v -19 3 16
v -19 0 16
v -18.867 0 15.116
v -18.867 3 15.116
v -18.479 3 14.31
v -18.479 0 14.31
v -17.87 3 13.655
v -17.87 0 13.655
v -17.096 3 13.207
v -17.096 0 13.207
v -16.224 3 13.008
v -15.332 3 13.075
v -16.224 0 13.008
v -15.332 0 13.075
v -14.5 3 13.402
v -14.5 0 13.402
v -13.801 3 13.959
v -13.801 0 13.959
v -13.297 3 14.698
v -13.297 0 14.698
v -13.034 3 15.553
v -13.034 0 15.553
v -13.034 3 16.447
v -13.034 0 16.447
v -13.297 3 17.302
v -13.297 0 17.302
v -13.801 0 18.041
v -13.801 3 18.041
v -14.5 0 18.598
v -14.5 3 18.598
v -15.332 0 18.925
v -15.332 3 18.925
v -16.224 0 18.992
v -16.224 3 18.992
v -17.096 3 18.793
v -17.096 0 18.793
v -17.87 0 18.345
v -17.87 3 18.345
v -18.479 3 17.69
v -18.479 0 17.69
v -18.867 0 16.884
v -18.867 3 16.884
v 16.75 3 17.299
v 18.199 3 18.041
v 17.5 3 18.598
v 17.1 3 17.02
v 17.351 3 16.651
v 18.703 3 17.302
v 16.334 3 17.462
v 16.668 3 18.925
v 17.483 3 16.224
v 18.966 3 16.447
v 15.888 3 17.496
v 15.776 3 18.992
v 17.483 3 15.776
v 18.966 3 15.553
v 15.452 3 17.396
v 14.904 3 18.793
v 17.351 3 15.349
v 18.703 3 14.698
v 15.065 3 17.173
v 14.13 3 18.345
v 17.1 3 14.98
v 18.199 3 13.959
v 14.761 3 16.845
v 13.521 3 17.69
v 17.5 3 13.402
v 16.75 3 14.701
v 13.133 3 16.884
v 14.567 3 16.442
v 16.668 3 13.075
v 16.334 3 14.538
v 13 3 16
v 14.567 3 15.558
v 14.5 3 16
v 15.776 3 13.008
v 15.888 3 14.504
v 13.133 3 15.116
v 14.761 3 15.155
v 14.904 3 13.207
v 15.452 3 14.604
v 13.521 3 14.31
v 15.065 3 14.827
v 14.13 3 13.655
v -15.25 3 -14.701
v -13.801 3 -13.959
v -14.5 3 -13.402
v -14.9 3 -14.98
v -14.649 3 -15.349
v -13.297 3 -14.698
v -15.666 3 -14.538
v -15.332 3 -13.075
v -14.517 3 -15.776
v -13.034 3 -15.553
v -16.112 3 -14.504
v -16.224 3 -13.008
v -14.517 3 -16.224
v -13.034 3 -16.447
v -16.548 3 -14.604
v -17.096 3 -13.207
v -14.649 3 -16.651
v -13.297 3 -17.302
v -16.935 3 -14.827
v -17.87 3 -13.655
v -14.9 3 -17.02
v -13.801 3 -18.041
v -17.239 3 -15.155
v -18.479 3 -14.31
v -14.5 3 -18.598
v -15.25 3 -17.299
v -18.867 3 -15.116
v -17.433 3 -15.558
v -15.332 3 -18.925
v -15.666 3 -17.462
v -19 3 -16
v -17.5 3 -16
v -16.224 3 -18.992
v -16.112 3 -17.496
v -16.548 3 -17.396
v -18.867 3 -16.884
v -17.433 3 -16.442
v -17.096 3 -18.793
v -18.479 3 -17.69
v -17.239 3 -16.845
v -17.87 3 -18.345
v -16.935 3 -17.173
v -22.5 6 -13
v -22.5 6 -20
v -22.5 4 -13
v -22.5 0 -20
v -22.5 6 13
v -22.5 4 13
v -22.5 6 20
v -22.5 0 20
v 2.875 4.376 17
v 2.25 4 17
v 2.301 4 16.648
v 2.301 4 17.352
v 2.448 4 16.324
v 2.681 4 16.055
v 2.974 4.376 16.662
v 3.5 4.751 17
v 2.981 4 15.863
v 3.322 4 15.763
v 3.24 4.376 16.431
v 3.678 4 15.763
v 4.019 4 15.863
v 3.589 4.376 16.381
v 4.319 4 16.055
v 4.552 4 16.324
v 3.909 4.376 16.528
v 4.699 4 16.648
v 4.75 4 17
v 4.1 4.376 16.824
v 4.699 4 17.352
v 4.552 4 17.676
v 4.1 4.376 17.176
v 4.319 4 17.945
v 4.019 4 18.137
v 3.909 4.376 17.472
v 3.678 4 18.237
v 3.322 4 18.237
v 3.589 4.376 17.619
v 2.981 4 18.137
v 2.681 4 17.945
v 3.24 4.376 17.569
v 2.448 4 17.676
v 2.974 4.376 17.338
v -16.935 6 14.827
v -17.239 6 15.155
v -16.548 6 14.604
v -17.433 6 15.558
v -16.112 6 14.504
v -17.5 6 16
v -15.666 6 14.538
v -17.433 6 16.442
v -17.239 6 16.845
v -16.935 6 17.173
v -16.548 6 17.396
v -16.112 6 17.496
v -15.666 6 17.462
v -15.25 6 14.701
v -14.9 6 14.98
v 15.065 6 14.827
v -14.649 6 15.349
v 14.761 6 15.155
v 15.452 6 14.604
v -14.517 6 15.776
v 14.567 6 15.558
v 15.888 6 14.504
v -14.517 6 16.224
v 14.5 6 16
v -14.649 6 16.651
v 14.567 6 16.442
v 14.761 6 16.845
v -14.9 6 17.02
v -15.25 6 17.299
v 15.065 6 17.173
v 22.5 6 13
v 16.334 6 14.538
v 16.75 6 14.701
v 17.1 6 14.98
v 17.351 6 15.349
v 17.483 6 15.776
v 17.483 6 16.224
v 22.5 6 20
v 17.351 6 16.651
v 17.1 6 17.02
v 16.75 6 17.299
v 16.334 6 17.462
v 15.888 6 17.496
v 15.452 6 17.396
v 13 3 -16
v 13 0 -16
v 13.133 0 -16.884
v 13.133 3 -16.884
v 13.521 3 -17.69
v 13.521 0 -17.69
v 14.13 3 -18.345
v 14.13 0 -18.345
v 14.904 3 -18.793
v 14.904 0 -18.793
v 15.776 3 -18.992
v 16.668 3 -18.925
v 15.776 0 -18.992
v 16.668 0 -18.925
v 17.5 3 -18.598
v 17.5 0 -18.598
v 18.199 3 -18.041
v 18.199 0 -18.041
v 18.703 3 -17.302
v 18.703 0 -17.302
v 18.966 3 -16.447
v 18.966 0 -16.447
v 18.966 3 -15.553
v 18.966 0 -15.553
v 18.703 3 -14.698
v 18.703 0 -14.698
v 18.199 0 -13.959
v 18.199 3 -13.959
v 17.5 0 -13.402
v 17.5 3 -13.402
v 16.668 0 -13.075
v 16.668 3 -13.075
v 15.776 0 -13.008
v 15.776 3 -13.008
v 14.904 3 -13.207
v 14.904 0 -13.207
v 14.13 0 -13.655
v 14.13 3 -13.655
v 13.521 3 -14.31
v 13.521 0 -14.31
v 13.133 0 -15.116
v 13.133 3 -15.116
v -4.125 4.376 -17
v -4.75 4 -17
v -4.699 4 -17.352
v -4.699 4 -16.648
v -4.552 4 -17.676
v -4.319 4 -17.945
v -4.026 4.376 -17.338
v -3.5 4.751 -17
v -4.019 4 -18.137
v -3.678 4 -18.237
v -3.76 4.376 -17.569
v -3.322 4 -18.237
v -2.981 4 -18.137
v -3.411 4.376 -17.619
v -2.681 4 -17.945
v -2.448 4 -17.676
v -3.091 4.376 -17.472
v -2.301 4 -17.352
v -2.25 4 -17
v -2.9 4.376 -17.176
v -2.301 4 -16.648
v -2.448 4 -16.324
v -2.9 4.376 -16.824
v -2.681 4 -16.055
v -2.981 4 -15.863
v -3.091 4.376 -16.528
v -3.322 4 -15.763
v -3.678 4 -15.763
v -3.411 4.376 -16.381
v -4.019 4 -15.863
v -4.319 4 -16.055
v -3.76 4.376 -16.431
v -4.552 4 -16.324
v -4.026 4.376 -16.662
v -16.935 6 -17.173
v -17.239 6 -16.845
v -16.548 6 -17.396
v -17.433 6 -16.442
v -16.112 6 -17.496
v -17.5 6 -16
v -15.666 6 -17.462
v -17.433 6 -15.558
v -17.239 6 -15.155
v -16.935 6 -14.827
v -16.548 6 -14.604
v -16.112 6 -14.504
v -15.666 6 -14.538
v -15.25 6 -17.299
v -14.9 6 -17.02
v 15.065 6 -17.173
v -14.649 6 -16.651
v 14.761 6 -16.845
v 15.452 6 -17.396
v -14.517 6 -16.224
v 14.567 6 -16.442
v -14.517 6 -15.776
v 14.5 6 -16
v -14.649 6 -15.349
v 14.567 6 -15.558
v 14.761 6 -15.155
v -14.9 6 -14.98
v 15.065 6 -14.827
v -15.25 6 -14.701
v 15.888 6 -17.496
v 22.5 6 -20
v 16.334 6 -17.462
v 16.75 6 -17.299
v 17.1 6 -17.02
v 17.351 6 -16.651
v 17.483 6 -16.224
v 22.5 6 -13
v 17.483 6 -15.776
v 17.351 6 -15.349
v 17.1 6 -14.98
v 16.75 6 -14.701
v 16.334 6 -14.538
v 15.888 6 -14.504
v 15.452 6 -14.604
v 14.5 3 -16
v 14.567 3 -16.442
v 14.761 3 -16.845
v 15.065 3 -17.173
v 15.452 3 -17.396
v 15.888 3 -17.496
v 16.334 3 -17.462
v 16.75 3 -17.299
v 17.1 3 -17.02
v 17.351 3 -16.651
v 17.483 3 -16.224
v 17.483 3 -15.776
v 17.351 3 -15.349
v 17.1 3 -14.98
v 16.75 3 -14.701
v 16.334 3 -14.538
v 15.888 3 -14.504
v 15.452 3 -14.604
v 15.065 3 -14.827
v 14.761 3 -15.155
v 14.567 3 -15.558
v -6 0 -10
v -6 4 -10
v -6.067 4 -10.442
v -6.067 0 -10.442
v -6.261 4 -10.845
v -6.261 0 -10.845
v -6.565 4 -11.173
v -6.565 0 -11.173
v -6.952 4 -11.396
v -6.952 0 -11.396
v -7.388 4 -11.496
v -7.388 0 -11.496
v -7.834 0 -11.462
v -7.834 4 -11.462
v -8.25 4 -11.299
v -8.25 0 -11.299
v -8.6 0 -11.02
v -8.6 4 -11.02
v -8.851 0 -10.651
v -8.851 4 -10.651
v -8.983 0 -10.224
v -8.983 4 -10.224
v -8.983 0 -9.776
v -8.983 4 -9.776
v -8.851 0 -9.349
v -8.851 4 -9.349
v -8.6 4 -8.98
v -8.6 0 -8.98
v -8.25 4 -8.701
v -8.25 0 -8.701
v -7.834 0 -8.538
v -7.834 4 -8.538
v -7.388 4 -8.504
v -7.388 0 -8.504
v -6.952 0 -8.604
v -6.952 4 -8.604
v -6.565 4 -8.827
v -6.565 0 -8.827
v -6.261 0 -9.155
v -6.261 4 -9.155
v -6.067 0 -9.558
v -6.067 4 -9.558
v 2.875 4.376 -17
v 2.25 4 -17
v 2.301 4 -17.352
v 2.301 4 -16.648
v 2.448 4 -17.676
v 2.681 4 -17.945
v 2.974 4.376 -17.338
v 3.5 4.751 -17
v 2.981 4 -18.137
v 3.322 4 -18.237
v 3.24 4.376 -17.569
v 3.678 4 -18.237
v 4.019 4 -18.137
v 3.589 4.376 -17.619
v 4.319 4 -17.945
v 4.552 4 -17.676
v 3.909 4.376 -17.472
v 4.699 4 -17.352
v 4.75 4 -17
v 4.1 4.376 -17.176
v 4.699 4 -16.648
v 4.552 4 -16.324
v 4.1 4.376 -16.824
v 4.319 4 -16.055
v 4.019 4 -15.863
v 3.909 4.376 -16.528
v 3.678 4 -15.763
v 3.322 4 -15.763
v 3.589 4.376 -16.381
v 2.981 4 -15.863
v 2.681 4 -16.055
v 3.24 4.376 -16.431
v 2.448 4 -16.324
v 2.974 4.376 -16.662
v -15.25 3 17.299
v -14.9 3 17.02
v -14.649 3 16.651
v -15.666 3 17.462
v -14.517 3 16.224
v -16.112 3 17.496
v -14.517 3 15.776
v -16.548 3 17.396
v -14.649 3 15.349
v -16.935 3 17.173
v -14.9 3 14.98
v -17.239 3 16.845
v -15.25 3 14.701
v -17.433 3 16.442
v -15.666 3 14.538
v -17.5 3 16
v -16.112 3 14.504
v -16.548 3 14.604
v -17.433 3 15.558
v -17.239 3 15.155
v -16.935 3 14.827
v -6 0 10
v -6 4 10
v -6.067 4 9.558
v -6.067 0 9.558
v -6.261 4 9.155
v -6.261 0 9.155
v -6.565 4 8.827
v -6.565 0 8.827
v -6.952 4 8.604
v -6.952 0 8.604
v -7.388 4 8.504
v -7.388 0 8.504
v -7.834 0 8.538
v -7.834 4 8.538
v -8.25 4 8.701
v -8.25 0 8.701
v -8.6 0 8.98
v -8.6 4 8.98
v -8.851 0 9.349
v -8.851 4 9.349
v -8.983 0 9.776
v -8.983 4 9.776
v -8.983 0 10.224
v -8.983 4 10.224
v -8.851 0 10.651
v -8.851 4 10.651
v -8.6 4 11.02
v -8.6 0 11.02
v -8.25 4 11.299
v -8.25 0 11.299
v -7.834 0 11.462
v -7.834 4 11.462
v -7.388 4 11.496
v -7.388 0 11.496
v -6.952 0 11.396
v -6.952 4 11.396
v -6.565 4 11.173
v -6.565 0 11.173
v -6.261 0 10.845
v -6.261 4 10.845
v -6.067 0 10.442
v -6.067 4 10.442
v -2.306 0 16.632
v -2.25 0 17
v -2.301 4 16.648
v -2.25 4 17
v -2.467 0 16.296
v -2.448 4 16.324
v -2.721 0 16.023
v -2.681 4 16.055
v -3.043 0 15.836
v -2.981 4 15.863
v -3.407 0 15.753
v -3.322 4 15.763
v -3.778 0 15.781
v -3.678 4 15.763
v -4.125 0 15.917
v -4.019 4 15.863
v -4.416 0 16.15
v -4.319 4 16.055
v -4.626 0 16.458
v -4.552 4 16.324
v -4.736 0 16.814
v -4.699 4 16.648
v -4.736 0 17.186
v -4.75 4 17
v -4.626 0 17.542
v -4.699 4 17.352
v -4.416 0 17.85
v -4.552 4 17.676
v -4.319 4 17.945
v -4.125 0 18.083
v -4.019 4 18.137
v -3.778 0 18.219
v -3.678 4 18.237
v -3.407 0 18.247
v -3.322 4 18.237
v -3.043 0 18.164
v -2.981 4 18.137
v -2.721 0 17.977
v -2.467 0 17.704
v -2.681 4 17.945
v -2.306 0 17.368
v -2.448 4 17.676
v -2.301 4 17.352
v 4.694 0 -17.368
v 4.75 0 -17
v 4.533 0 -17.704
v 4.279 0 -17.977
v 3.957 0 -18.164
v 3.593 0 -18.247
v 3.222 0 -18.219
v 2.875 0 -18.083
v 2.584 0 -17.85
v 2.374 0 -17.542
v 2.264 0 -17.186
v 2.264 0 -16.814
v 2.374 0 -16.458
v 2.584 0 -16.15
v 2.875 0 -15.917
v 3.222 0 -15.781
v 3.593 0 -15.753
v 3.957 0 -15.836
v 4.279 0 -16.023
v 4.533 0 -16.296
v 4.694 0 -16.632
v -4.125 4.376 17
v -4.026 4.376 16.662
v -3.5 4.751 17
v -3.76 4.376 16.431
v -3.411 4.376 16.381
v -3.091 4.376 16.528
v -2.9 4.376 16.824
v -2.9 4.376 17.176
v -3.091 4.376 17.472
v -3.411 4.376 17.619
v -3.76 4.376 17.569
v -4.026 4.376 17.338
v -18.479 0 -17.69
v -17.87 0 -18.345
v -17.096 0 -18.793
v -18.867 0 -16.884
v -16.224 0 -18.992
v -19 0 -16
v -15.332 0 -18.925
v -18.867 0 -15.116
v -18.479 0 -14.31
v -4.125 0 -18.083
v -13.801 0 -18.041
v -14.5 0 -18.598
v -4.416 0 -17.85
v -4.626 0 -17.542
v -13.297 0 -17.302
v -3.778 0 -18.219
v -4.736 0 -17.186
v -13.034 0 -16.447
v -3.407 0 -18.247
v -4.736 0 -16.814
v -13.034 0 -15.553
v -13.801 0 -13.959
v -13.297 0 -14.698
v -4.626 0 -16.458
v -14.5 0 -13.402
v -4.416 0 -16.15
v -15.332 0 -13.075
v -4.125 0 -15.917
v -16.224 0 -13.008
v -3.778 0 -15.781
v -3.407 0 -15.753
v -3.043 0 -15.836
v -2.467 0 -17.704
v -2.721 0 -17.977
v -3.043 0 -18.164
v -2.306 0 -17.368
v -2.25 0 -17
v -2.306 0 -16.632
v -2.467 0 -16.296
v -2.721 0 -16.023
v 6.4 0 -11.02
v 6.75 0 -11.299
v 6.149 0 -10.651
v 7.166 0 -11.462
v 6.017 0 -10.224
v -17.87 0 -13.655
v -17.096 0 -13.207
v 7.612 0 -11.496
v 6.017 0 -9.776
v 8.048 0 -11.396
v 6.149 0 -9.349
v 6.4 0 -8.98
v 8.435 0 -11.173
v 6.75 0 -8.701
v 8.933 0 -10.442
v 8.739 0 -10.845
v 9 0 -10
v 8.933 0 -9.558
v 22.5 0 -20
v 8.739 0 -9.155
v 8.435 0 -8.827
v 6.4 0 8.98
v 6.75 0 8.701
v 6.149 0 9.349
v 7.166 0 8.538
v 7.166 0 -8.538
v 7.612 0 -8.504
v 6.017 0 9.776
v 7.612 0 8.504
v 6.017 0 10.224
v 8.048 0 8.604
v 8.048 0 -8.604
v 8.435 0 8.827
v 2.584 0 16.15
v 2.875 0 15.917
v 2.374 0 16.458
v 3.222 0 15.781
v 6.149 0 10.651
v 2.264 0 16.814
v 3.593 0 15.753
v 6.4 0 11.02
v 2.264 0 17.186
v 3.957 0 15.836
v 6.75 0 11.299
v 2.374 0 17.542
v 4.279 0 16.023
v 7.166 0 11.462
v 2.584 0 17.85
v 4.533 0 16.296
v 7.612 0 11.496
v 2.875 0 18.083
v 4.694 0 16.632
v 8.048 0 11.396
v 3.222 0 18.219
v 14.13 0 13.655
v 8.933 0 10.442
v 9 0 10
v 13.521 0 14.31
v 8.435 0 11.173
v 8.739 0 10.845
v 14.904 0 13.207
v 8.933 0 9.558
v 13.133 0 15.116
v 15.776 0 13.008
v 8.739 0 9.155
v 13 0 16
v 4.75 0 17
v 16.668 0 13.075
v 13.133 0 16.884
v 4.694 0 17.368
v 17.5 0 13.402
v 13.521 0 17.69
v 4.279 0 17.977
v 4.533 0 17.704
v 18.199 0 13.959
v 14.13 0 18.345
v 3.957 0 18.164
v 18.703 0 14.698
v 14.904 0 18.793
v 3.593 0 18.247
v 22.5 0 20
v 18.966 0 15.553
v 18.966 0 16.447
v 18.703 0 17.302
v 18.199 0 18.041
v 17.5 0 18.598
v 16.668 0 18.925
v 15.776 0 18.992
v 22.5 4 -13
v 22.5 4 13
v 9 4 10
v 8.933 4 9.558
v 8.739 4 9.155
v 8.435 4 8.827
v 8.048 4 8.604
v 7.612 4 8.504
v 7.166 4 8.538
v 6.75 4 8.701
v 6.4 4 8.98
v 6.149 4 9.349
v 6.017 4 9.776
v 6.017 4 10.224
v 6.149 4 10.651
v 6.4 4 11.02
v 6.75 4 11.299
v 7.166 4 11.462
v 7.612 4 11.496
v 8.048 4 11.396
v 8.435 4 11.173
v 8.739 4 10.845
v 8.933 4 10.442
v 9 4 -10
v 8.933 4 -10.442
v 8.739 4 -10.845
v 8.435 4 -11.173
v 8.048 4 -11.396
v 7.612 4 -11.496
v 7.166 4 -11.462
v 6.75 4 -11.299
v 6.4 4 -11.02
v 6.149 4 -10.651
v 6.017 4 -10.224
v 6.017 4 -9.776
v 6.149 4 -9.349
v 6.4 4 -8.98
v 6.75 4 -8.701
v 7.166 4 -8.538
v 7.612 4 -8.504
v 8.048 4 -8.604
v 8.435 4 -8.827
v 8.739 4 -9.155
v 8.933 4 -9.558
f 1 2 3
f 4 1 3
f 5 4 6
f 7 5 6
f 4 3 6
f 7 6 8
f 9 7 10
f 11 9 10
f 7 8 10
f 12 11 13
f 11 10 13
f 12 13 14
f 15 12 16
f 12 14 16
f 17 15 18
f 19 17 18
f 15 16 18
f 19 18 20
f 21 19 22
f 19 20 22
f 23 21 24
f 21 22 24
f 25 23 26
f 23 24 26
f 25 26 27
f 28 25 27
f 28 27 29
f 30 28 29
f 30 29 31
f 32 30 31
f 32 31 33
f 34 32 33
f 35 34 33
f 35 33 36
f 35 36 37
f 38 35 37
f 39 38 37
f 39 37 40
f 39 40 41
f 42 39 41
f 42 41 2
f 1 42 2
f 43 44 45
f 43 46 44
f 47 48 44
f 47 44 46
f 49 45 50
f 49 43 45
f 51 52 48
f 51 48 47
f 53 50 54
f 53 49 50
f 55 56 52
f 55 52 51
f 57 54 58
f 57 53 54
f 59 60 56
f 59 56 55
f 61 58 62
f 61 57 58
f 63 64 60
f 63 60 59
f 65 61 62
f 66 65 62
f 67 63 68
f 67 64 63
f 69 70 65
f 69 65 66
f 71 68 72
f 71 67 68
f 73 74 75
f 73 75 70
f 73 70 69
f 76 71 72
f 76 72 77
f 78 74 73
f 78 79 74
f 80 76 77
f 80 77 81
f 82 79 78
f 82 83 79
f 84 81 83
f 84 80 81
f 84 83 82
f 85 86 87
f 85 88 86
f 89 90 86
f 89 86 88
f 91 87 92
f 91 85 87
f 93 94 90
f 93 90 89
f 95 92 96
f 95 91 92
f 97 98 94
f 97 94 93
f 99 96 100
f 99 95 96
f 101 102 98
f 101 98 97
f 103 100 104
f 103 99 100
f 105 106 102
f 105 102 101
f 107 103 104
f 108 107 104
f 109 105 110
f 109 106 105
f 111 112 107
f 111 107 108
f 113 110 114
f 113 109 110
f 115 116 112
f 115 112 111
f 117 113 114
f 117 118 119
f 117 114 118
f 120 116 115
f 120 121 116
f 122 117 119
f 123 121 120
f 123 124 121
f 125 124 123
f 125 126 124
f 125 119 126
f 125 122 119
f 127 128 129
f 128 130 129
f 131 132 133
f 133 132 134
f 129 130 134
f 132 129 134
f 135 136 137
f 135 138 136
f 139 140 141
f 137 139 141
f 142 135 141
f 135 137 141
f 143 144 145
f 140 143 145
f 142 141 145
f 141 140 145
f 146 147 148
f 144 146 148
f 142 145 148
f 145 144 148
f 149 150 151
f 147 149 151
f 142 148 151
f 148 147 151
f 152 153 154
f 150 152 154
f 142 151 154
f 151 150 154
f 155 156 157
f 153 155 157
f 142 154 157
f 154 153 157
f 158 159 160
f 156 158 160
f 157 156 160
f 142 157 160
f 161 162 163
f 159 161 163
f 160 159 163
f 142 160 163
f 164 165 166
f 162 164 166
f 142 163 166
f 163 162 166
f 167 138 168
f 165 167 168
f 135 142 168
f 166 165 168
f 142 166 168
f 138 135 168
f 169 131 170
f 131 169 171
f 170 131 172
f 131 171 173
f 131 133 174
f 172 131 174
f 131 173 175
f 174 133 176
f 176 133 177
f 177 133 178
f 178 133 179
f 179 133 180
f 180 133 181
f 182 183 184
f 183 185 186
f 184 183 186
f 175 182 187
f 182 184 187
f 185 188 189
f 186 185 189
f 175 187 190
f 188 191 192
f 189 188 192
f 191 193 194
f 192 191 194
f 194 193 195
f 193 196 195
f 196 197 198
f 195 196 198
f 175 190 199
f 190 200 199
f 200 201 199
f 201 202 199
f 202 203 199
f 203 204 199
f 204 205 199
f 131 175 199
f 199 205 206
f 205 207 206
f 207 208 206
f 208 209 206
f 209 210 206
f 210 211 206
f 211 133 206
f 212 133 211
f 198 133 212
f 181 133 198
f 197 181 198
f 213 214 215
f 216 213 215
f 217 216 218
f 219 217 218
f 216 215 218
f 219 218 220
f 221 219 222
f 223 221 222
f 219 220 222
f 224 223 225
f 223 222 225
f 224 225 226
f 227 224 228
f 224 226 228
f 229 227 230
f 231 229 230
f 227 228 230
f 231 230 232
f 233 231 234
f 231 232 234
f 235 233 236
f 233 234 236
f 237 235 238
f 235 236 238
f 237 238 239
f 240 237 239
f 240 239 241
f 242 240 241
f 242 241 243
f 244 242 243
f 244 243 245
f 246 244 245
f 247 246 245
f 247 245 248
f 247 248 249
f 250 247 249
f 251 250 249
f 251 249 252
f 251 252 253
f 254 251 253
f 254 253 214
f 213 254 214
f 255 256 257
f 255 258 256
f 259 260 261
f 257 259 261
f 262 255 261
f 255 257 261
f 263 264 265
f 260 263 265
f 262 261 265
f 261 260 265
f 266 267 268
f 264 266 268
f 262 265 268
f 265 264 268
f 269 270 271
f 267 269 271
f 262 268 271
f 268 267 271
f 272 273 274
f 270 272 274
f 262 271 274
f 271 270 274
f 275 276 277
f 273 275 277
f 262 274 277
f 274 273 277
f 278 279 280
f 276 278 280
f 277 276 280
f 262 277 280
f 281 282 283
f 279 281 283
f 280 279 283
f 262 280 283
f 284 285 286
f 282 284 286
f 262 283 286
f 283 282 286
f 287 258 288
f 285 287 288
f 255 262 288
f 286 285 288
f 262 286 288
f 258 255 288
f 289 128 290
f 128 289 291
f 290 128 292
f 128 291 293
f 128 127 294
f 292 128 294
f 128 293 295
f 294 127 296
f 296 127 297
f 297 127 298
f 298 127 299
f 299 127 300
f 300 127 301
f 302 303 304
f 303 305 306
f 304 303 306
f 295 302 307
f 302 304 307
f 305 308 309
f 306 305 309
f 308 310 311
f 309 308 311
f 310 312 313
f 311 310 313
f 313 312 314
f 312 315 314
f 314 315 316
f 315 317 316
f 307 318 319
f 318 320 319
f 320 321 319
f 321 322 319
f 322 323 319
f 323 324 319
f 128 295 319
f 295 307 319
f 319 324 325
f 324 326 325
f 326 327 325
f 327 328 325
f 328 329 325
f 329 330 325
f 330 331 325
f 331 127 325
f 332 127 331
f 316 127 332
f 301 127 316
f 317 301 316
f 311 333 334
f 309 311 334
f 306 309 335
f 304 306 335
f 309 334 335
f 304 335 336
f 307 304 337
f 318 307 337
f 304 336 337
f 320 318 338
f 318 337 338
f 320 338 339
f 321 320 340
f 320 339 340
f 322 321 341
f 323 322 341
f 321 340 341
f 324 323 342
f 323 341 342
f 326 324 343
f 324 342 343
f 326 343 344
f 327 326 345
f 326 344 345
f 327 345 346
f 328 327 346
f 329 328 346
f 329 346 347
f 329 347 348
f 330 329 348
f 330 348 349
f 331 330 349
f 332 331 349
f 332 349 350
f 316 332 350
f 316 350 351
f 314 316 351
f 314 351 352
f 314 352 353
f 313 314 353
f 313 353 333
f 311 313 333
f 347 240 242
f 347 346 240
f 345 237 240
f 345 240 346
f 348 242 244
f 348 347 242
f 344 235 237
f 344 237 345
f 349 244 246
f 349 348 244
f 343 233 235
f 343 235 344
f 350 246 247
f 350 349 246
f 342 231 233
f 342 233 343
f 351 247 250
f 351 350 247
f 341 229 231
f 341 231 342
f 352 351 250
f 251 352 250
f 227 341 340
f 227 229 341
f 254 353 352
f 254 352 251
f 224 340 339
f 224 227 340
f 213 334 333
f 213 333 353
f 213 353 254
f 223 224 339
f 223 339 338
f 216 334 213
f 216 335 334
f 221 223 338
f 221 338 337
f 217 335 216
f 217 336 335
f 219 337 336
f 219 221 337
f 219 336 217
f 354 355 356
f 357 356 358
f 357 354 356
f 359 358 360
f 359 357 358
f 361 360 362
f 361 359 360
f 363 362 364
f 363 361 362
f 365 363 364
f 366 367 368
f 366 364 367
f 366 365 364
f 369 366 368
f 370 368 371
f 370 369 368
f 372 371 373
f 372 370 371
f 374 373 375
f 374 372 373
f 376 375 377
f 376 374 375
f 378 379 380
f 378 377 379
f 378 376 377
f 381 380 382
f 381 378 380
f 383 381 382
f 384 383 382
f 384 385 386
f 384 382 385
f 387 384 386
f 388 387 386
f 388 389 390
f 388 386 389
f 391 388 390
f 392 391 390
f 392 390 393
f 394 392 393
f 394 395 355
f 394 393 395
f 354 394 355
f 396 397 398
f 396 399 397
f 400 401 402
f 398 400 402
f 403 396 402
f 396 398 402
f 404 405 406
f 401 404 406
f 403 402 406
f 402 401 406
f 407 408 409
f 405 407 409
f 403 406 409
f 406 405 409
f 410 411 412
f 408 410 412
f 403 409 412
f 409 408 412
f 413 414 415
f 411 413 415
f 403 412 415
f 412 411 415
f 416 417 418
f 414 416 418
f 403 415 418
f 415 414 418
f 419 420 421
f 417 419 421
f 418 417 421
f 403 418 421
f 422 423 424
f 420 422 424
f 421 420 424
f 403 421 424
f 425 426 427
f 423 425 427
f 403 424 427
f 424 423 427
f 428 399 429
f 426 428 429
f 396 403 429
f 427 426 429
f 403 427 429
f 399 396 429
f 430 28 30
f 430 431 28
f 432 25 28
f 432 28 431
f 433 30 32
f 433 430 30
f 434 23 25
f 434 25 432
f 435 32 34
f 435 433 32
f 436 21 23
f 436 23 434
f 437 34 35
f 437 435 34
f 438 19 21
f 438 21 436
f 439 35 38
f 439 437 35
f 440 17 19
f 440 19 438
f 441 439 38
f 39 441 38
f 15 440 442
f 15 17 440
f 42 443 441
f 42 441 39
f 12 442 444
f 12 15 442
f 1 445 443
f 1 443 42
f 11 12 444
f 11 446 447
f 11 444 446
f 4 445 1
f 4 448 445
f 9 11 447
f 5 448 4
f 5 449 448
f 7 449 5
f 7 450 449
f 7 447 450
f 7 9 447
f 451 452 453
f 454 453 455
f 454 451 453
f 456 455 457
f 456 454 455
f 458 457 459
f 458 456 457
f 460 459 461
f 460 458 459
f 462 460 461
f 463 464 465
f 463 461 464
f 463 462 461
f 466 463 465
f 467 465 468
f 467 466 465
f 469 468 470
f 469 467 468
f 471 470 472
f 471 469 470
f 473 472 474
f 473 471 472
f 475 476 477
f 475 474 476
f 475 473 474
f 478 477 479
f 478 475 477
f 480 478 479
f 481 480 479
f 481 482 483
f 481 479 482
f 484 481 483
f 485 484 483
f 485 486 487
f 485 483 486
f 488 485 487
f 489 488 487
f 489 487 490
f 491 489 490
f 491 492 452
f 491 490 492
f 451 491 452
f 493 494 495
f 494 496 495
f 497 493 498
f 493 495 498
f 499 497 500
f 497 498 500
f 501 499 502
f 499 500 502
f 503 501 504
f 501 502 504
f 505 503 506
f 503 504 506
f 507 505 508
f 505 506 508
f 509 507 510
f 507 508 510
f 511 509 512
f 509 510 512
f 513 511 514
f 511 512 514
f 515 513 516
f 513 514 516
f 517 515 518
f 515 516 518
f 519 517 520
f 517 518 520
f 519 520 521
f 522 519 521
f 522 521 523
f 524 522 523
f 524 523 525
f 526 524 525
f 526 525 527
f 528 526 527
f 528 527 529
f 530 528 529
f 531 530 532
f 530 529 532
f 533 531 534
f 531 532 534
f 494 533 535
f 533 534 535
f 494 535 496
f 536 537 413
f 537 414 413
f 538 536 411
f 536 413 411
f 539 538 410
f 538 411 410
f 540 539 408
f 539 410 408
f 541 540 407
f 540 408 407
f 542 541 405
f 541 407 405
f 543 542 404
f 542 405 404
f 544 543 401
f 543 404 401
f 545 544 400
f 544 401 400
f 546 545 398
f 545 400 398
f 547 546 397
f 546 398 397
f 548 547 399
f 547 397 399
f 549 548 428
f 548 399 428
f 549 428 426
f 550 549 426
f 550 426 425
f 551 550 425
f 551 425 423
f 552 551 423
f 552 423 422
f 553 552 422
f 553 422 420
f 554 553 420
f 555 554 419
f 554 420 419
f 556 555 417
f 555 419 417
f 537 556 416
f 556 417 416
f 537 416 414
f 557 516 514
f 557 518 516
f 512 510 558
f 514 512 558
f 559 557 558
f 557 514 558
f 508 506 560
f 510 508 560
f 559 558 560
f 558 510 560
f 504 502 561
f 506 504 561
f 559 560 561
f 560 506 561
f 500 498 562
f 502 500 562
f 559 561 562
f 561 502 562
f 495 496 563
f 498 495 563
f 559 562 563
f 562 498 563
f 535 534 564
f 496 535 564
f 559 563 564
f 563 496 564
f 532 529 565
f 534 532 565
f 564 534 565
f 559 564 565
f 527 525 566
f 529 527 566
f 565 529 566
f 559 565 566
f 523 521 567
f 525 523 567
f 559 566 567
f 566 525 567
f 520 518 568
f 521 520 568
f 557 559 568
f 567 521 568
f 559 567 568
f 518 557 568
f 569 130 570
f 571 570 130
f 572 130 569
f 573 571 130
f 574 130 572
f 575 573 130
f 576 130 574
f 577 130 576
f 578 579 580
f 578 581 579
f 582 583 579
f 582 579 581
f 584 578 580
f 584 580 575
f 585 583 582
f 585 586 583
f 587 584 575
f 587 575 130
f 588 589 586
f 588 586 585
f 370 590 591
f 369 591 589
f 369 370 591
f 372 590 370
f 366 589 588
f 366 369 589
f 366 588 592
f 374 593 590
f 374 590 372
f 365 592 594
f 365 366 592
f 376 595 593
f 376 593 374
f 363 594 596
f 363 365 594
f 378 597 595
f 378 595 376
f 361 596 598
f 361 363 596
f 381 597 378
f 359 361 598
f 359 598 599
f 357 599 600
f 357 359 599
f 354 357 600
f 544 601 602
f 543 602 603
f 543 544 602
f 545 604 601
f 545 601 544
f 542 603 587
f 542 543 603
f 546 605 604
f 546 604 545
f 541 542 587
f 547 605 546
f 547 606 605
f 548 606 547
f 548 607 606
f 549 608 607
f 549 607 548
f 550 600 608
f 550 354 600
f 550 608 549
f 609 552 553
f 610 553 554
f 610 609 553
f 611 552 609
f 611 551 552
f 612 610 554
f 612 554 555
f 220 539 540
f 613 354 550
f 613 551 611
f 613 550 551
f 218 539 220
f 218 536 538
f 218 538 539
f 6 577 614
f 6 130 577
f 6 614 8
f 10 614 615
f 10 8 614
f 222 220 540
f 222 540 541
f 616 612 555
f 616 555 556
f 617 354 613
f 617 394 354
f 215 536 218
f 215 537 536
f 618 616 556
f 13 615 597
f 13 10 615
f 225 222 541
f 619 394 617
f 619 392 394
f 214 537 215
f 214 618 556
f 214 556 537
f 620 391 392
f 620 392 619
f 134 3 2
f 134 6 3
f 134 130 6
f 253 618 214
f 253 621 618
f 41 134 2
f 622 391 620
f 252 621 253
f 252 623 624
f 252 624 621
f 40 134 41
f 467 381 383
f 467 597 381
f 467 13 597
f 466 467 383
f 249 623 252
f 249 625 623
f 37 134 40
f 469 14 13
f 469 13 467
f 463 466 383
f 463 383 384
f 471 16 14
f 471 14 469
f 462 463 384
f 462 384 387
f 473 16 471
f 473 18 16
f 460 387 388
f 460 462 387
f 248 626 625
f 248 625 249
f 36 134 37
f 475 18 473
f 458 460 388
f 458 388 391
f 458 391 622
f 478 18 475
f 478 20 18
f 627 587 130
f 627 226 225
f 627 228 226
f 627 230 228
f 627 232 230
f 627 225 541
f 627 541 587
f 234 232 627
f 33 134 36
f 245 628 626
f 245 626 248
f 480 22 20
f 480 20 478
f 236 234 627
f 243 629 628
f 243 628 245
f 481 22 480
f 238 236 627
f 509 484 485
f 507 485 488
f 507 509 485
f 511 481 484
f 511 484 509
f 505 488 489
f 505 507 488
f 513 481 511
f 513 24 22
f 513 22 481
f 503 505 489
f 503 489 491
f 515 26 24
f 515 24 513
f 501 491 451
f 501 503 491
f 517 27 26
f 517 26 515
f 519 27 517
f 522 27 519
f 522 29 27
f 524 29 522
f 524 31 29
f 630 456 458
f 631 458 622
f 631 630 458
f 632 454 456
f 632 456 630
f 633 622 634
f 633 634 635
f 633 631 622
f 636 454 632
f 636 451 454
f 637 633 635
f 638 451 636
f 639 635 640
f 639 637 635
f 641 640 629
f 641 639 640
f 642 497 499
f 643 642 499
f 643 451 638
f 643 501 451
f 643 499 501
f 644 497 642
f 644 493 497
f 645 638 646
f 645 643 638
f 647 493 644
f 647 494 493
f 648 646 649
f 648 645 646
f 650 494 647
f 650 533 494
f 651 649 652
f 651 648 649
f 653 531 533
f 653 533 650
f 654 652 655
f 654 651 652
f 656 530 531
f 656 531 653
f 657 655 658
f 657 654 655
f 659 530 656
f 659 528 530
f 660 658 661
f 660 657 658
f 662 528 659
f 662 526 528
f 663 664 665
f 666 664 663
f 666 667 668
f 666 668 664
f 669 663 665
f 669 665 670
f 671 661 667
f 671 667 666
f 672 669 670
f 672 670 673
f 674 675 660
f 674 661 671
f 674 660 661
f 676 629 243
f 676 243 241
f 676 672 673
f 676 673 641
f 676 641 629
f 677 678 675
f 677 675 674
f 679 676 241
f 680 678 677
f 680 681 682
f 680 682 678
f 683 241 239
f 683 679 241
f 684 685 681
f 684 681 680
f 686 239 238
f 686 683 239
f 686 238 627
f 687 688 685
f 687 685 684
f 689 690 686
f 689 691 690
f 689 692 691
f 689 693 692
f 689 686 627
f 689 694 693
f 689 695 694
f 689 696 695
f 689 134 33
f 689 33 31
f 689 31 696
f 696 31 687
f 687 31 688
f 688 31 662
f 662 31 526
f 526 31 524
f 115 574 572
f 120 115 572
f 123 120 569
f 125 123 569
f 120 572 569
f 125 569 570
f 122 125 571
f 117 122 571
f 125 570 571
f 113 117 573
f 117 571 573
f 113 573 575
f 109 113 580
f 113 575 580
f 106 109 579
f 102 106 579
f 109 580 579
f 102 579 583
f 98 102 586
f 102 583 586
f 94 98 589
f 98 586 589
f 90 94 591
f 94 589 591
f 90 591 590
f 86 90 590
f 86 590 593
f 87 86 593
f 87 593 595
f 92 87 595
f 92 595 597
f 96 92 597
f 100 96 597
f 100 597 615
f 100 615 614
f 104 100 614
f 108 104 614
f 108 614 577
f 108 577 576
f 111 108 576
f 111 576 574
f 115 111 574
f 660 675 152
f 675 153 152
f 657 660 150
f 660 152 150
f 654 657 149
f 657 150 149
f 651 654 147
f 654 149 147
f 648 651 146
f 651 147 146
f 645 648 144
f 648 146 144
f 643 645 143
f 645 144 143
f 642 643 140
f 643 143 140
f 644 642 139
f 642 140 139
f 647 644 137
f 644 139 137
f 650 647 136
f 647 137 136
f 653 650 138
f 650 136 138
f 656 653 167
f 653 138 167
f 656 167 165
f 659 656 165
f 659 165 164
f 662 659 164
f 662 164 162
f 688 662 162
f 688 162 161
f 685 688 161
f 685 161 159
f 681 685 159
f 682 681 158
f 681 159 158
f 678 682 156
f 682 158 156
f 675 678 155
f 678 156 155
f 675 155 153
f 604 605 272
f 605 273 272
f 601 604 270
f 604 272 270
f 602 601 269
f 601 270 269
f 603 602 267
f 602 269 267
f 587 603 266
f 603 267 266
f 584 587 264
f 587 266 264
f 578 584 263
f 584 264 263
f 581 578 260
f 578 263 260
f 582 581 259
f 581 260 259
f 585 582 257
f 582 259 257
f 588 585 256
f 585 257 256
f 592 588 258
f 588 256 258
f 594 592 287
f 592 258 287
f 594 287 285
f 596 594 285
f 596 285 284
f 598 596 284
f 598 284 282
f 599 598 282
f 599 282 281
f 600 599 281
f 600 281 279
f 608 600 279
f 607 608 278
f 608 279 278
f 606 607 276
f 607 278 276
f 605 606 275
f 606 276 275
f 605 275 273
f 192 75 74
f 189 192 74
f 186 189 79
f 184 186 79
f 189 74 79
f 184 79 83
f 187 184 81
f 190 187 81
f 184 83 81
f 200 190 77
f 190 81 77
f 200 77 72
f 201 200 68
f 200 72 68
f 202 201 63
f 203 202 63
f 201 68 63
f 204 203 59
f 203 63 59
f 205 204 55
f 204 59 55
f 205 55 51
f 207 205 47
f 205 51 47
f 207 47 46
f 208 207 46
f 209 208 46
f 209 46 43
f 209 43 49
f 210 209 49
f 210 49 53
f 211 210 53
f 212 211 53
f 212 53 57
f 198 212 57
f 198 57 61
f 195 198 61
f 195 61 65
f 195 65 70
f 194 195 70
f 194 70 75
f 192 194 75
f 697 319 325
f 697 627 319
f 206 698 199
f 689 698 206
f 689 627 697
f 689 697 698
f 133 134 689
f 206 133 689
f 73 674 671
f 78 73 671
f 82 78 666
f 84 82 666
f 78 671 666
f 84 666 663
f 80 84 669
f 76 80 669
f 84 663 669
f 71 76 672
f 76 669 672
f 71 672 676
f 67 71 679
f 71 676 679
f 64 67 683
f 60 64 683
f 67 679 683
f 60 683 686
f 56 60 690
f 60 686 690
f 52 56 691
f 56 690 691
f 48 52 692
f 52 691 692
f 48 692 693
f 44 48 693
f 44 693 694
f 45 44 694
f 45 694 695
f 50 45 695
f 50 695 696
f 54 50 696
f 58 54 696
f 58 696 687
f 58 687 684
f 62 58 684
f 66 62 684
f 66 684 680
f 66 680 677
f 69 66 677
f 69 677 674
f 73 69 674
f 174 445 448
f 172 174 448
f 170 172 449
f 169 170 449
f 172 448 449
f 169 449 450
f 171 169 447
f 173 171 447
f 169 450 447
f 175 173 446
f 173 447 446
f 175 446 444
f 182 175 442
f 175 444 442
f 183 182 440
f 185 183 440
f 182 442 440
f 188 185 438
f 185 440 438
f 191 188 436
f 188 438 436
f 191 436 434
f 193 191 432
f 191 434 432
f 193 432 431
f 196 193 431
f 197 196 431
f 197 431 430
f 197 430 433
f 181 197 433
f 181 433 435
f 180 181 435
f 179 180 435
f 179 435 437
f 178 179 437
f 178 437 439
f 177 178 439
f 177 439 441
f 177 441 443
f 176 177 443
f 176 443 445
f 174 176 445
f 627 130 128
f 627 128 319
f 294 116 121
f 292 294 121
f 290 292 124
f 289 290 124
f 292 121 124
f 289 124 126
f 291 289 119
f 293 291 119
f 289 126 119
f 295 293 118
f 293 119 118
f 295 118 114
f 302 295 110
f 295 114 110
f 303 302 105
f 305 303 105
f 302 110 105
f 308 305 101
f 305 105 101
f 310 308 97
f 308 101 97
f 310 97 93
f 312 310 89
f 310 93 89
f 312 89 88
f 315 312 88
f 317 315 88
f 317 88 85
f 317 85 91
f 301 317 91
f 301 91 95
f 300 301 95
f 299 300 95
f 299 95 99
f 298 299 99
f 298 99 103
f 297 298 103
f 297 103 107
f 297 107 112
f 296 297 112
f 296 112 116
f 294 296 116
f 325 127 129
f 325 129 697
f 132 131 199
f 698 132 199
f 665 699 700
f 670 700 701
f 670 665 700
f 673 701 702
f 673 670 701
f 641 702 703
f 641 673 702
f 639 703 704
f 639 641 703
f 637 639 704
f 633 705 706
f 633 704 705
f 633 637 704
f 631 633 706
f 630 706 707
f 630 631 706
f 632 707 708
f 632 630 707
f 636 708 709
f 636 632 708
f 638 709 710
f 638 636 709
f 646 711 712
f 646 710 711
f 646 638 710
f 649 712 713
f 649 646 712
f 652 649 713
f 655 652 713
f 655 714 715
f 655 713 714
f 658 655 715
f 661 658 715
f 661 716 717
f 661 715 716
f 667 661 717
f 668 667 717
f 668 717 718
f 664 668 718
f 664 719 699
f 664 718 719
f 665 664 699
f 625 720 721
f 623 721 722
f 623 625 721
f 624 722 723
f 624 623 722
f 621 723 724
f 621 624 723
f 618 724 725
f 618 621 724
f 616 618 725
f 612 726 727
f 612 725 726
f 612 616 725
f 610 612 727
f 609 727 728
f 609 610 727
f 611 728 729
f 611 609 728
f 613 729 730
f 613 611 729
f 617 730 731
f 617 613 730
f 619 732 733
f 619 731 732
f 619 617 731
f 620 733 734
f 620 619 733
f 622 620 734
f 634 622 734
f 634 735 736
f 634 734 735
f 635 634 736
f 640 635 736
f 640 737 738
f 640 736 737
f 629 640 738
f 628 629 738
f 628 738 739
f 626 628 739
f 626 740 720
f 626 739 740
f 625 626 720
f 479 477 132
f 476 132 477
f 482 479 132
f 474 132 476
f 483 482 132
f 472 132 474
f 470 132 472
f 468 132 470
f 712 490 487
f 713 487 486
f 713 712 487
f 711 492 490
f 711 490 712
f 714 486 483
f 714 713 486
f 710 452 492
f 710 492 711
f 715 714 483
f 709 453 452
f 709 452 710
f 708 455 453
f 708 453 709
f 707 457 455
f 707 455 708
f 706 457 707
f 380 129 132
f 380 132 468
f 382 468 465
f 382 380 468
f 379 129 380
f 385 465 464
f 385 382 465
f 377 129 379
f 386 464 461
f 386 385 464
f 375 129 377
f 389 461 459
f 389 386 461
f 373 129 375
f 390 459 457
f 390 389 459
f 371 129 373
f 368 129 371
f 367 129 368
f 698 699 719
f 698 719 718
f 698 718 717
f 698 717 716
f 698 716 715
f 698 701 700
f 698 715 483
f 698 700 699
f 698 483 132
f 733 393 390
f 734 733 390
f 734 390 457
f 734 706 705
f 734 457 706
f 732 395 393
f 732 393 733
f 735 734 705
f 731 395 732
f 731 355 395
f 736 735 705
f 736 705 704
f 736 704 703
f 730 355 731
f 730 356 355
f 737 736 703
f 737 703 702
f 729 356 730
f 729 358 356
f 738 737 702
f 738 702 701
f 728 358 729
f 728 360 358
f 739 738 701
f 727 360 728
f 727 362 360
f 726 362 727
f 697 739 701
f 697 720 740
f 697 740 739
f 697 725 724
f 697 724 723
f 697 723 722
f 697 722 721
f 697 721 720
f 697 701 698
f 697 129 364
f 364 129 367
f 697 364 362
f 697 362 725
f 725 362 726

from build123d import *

# Parameters (mm, degrees)
SKETCH_2_W                = 45
SKETCH_2_H                = 33
SKETCH_2_R                = 1.5
EXTRUDE_1_DEPTH           = 6
SKETCH_3_W                = 45
SKETCH_3_H                = 3.5
EXTRUDE_2_DEPTH           = 6
SKETCH_20_W               = 45
SKETCH_20_H               = 27.5
CUT_EXTRUDE_5_DEPTH       = 2
EXTRUDE_START             = -2
SKETCH_21_W               = 45
SKETCH_21_H               = 3.5
EXTRUDE_3_DEPTH           = 2
HOLE_WIZARD_3_0_3_1_D     = 3
HOLE_WIZARD_3_0_3_1_DEPTH = 6
HOLE_WIZARD_M3_2_D        = 2.5
HOLE_WIZARD_M3_2_DEPTH    = 4
HOLE_WIZARD_M3_2_TIP      = 0.751075774
HOLE_WIZARD_1_D           = 3
HOLE_WIZARD_1_DEPTH       = 6
HOLE_WIZARD_1_CBORE_D     = 6
HOLE_WIZARD_1_CBORE_DEPTH = 3


with BuildPart() as part:
    # 草图2 → 凸台-拉伸1 (new body)
    with BuildSketch(Plane(origin=(0, 0, 0), x_dir=(1, 0, 0), z_dir=(0, 1, 0))):
        Rectangle(SKETCH_2_W, SKETCH_2_H)
        with Locations((-7.5, 10)):
            Circle(SKETCH_2_R, mode=Mode.SUBTRACT)
        with Locations((7.5, 10)):
            Circle(SKETCH_2_R, mode=Mode.SUBTRACT)
        with Locations((-7.5, -10)):
            Circle(SKETCH_2_R, mode=Mode.SUBTRACT)
        with Locations((7.5, -10)):
            Circle(SKETCH_2_R, mode=Mode.SUBTRACT)
    extrude(amount=EXTRUDE_1_DEPTH)

    # 草图3 → 凸台-拉伸2 (add)
    with BuildSketch(Plane.XZ):
        with Locations((0, -18.25)):
            Rectangle(SKETCH_3_W, SKETCH_3_H)
        with Locations((0, 18.25)):
            Rectangle(SKETCH_3_W, SKETCH_3_H)
    extrude(amount=-EXTRUDE_2_DEPTH)

    # 草图20 → 切除-拉伸5 (cut)
    with BuildSketch(Plane(origin=(0, 6, 0), x_dir=(1, 0, 0), z_dir=(0, 1, 0))):
        Rectangle(SKETCH_20_W, SKETCH_20_H)
    extrude(amount=-CUT_EXTRUDE_5_DEPTH, mode=Mode.SUBTRACT)

    # 草图21 → 凸台-拉伸3 (add)
    with BuildSketch(Plane.XZ.offset(-4).offset(EXTRUDE_START)):
        with Locations((0, -14.75)):
            Rectangle(SKETCH_21_W, SKETCH_21_H)
        with Locations((0, 14.75)):
            Rectangle(SKETCH_21_W, SKETCH_21_H)
    extrude(amount=EXTRUDE_3_DEPTH)

    # Ø3.0 (3) 直径孔1
    with Locations(Plane(origin=(0, 6, 0), x_dir=(1, 0, 0), z_dir=(0, 1, 0))):
        with Locations((-16, 16), (16, 16), (16, -16), (-16, -16)):
            Hole(HOLE_WIZARD_3_0_3_1_D / 2, depth=HOLE_WIZARD_3_0_3_1_DEPTH)

    # M3 螺纹孔2
    with Locations(Plane(origin=(0, 0, 0), x_dir=(-1, 0, 0), z_dir=(0, -1, 0))):
        with Locations((3.5, -17), (-3.5, -17), (-3.5, 17), (3.5, 17)):
            Hole(HOLE_WIZARD_M3_2_D / 2, depth=HOLE_WIZARD_M3_2_DEPTH)
            with Locations((0, 0, -(HOLE_WIZARD_M3_2_DEPTH + HOLE_WIZARD_M3_2_TIP / 2))):  # 118° drill point
                Cone(0, HOLE_WIZARD_M3_2_D / 2, HOLE_WIZARD_M3_2_TIP, mode=Mode.SUBTRACT)

    # 打孔尺寸(%根据)内六角圆柱头螺钉的类型1
    with Locations(Plane(origin=(0, 0, 0), x_dir=(-1, 0, 0), z_dir=(0, -1, 0))):
        with Locations((-16, 16), (16, 16), (16, -16), (-16, -16)):
            CounterBoreHole(HOLE_WIZARD_1_D / 2, HOLE_WIZARD_1_CBORE_D / 2, HOLE_WIZARD_1_CBORE_DEPTH, depth=HOLE_WIZARD_1_DEPTH)


solid = part.part
